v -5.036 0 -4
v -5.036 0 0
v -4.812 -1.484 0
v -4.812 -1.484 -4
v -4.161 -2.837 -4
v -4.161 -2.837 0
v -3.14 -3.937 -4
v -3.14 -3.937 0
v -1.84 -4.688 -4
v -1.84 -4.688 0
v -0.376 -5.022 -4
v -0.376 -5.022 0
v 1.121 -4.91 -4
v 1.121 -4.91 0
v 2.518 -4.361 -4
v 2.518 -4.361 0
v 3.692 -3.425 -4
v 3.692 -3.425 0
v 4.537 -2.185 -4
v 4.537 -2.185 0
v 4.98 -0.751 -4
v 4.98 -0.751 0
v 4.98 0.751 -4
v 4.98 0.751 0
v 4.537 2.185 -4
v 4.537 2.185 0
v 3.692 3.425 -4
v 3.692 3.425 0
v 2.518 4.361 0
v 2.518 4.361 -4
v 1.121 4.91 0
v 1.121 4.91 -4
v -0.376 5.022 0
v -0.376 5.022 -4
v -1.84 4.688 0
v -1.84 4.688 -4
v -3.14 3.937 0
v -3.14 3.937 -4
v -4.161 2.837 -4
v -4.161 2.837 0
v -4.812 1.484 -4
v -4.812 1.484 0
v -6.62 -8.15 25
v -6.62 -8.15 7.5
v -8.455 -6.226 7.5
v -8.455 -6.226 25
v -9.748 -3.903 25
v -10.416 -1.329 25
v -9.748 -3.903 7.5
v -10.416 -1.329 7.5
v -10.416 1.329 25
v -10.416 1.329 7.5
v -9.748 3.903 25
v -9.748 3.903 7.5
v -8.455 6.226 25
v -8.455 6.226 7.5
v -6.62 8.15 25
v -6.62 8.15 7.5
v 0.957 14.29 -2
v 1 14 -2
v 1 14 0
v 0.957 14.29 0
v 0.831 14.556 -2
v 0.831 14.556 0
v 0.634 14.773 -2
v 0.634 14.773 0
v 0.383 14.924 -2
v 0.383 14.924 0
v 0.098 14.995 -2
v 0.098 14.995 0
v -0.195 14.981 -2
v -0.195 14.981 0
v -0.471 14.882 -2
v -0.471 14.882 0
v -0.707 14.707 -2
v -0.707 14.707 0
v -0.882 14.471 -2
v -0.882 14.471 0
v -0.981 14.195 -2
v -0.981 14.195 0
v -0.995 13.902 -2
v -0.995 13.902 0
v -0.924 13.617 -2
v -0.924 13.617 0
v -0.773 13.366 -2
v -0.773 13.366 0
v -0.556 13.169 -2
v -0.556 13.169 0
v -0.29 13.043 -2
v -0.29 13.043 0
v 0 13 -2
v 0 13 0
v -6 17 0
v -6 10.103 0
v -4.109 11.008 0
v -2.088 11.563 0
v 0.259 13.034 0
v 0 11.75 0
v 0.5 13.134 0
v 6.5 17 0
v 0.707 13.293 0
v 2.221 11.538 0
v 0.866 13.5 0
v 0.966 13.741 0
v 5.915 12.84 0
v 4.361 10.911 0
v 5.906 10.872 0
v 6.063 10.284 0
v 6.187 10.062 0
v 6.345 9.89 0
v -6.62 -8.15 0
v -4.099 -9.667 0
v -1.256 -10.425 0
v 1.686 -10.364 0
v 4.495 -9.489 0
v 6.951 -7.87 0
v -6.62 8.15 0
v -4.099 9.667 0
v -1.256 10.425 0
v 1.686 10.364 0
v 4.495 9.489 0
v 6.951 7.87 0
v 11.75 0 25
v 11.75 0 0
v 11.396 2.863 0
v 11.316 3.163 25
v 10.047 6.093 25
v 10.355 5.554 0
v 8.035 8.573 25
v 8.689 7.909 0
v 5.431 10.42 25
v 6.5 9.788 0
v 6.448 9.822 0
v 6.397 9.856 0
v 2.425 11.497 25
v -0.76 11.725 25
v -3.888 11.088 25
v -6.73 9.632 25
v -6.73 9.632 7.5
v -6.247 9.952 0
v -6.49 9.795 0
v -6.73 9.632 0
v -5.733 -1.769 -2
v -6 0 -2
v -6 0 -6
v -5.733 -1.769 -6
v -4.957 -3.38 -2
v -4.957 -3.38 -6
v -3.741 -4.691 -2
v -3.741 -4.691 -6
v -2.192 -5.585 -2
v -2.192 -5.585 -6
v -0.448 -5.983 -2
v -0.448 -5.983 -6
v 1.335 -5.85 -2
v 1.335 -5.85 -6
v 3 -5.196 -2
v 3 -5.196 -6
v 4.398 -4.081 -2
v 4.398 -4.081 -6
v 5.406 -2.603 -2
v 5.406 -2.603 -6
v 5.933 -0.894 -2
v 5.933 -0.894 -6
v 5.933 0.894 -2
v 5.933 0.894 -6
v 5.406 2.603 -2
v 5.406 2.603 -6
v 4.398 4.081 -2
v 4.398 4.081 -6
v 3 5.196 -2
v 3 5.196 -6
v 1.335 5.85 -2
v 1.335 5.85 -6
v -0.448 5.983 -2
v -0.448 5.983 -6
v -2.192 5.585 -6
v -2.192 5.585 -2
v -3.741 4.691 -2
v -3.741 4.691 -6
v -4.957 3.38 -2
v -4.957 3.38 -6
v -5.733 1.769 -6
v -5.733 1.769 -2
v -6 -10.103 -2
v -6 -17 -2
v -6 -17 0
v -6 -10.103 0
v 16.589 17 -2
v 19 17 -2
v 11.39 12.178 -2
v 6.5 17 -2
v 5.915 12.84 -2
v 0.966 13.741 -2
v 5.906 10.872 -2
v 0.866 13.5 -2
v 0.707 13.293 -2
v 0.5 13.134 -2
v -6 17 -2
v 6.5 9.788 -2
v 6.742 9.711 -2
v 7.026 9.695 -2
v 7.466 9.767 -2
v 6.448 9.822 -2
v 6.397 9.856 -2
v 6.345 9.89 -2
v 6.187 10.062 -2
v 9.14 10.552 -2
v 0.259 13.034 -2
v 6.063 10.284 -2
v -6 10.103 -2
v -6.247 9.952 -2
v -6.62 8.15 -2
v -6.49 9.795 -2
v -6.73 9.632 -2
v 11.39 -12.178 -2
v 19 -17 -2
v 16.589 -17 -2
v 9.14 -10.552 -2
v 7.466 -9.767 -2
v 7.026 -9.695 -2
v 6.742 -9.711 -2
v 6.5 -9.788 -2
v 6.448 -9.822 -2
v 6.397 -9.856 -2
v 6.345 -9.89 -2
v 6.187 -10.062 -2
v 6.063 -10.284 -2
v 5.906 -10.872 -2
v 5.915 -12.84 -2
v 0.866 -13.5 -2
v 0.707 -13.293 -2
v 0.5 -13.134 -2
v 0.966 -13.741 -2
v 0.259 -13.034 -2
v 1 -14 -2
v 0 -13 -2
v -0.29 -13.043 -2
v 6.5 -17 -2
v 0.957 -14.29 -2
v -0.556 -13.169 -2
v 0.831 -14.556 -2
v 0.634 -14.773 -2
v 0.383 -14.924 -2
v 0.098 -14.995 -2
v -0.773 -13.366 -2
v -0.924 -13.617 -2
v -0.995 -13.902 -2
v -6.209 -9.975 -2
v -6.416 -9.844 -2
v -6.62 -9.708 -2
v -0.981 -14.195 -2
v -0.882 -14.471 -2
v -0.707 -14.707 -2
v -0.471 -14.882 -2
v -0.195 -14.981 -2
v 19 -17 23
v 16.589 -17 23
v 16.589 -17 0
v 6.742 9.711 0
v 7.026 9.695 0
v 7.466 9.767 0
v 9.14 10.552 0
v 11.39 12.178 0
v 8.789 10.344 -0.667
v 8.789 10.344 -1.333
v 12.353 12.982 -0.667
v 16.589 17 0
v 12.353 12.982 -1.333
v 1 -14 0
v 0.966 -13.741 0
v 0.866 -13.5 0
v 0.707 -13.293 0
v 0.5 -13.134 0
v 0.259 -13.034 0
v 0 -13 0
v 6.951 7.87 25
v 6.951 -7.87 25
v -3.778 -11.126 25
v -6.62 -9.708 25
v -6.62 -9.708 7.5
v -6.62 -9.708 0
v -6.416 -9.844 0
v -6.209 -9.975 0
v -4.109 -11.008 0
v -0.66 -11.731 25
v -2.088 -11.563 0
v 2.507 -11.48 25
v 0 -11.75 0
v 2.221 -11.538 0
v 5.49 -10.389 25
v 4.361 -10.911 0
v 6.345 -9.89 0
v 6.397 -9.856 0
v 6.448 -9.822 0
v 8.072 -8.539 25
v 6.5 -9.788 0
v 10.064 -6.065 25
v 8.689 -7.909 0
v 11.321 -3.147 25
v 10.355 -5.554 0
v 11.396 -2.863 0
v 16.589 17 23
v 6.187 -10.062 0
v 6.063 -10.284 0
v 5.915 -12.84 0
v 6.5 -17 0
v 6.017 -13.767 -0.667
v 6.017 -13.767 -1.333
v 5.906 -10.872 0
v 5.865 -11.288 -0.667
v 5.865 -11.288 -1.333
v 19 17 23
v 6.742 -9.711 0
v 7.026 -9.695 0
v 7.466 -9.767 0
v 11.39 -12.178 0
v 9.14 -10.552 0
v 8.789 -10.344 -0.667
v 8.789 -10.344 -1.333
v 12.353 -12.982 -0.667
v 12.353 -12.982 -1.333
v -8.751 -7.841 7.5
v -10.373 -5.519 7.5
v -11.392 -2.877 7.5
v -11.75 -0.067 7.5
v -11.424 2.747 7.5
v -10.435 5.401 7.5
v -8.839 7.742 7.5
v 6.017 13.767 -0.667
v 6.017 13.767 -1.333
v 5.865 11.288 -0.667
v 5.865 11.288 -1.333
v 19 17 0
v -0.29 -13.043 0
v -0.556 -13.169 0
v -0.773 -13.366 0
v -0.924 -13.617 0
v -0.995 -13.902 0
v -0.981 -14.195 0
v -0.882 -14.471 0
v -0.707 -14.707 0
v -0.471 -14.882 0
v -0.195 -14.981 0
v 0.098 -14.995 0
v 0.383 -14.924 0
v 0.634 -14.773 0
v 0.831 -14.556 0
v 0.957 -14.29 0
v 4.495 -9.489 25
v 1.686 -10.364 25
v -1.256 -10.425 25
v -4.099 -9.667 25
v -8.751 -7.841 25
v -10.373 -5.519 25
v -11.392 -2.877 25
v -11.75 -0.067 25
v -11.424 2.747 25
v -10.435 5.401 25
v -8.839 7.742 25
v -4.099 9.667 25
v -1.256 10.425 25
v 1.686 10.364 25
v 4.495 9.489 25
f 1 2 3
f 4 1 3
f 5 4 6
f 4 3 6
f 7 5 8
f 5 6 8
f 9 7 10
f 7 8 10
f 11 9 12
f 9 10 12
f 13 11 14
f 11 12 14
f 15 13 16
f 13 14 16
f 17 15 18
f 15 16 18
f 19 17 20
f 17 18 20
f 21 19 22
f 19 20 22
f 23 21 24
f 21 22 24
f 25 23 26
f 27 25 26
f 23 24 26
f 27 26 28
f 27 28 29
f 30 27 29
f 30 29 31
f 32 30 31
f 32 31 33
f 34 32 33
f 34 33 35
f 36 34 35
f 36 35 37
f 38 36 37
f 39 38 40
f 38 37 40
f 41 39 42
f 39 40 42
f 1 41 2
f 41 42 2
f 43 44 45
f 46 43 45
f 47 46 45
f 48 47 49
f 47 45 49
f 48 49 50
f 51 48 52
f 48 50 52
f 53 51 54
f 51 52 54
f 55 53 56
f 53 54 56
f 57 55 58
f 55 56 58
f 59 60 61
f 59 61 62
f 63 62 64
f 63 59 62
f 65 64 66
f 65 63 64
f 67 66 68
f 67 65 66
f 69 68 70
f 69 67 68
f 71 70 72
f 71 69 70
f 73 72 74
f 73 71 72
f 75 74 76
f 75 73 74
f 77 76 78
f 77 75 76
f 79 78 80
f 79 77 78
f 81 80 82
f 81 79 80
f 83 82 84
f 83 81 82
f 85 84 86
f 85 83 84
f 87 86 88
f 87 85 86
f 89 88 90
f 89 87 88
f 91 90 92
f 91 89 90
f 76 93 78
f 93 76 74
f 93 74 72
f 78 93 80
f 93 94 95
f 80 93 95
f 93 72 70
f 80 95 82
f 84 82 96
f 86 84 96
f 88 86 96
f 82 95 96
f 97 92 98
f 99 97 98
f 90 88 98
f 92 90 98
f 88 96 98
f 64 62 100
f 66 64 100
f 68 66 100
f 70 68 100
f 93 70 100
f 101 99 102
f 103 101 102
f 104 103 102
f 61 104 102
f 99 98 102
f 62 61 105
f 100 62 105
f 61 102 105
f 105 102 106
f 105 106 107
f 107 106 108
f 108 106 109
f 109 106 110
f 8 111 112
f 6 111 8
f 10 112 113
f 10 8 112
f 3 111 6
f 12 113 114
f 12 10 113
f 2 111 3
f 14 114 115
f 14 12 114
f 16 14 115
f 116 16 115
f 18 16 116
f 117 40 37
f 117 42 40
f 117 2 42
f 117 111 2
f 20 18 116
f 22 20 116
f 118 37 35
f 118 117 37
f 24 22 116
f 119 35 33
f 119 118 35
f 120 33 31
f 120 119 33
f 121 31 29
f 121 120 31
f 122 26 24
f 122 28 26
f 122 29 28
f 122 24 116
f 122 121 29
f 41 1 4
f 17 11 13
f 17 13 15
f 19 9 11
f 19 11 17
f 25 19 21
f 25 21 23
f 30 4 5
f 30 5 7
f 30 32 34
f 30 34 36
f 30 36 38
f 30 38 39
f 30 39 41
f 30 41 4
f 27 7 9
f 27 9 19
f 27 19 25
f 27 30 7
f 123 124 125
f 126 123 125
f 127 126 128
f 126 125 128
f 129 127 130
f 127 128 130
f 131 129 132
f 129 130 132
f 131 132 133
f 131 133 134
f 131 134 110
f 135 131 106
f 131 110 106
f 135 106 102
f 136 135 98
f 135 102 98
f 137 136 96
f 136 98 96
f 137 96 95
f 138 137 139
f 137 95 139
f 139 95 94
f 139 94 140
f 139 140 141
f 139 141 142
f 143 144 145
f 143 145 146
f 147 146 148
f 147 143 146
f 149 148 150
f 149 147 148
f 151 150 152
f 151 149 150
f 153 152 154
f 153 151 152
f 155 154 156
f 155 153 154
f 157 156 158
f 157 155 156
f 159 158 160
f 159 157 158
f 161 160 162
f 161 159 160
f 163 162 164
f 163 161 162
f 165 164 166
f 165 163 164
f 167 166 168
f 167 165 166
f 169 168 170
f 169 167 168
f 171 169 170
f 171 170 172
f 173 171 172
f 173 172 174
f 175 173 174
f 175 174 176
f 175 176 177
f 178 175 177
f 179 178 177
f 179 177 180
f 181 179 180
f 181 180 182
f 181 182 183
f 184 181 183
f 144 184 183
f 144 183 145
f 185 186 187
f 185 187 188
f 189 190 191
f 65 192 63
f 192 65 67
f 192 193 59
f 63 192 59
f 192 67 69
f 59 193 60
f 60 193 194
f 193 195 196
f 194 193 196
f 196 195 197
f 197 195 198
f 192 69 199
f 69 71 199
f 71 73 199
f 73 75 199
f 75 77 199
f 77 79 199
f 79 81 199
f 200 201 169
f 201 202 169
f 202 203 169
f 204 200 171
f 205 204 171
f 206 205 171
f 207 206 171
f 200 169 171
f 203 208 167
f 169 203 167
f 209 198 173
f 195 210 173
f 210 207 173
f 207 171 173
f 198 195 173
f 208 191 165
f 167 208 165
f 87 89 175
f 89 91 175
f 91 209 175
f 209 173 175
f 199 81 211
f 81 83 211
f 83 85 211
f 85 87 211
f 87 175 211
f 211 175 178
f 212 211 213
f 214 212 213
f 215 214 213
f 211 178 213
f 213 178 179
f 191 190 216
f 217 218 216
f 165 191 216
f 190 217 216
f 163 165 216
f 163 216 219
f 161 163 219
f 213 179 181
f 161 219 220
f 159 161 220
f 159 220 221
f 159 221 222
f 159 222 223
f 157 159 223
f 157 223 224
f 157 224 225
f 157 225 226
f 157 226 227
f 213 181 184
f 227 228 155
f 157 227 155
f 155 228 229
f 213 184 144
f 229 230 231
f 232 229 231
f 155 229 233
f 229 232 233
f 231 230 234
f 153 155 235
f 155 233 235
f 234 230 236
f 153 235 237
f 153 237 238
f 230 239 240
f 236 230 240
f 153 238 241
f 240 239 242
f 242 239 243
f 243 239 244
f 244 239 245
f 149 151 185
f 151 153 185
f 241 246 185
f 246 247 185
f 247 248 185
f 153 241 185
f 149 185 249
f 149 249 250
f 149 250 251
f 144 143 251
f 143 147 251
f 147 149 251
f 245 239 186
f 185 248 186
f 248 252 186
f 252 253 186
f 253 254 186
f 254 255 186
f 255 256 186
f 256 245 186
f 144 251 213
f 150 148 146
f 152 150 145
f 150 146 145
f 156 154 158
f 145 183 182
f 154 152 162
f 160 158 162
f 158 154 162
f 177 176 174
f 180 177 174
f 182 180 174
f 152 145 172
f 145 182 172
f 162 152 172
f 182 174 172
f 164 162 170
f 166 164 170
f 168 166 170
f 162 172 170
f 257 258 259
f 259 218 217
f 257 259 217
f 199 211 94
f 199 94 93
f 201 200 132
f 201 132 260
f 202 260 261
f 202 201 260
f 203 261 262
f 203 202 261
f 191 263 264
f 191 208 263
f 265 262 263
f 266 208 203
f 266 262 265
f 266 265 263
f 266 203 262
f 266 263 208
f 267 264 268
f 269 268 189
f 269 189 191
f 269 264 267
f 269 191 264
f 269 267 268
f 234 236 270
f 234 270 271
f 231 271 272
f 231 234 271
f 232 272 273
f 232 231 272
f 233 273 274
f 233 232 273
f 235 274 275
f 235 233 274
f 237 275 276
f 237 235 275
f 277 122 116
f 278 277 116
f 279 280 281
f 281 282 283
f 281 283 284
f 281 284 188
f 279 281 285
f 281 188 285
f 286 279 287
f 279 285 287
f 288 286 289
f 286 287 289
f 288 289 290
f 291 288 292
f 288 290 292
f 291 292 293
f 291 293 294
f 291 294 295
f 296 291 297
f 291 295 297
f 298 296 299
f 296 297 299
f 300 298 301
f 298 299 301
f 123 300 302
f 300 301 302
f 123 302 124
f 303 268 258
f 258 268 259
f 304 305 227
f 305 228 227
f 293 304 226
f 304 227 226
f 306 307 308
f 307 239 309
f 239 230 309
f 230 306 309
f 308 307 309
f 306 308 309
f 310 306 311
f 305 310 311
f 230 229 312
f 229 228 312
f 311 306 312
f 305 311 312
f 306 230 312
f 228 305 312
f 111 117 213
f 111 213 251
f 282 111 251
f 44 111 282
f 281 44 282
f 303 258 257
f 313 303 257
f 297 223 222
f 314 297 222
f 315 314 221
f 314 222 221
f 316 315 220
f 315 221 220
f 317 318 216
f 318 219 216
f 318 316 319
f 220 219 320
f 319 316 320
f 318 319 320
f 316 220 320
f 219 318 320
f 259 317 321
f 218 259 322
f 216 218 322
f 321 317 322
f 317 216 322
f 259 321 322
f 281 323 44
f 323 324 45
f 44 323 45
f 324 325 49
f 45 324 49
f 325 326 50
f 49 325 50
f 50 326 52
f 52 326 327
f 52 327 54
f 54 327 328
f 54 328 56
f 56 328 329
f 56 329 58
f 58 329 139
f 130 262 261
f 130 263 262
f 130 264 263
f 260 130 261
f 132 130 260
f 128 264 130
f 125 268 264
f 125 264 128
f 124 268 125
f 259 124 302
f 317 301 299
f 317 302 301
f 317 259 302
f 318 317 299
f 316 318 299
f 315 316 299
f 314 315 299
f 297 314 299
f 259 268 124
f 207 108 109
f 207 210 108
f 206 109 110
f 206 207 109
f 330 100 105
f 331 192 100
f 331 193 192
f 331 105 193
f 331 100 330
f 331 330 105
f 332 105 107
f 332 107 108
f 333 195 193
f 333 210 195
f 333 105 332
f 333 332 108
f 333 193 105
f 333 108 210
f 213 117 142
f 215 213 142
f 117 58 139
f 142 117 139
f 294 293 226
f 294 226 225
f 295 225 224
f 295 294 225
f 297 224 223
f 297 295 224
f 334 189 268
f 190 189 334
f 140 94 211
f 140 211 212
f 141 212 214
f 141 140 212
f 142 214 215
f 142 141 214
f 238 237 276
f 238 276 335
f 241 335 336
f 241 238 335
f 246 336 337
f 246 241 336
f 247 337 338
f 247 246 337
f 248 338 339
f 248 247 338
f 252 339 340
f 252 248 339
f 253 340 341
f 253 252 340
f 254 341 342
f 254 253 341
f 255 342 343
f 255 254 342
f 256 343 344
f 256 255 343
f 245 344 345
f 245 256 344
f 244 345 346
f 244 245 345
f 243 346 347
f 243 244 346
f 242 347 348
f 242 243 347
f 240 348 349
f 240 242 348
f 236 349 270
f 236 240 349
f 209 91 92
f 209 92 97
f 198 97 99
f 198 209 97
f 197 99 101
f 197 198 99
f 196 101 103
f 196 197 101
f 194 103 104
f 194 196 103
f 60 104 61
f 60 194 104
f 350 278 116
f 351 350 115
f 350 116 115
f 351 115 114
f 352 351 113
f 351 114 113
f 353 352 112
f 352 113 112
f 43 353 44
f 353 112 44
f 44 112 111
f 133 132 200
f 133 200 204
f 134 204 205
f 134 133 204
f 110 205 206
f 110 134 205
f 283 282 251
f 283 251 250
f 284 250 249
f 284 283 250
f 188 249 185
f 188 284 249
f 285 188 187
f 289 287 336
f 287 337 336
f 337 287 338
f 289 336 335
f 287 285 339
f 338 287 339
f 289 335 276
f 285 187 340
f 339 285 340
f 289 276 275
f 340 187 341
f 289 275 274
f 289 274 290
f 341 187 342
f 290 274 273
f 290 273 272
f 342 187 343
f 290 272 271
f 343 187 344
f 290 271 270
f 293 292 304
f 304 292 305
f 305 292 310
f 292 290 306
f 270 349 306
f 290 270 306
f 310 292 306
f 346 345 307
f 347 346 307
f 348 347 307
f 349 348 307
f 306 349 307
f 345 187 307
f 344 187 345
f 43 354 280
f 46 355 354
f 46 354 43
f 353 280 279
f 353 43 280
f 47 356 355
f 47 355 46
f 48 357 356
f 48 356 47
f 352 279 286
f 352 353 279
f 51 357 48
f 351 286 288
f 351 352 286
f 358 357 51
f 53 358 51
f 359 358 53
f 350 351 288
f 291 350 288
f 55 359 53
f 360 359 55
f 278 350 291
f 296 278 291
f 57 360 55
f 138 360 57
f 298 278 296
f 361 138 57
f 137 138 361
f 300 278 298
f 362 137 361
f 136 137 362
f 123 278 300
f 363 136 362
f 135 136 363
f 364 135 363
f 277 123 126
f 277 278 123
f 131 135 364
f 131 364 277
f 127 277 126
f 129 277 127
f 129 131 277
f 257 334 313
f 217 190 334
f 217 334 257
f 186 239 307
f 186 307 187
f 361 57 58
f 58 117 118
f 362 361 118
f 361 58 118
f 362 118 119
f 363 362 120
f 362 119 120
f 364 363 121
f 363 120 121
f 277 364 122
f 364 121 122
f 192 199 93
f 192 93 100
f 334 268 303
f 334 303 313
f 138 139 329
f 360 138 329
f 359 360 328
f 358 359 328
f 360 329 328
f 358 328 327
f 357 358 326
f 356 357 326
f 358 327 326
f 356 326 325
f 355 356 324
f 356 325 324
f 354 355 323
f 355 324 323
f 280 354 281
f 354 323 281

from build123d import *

# Parameters (mm, degrees)
F1_DEPTH = 2
F2_DEPTH = 25
F3_DEPTH = 6
F4_DEPTH = 4
F5_DEPTH = 7.5
F6_W     = 2.410814777
F6_H     = 34
F7_DEPTH = 2
F8_DEPTH = 25


with BuildPart() as f1:
    # F0 (on Top) → F1 (new body)
    with BuildSketch(Plane.XY):
        with BuildLine():
            Line((-6.7297284225, 9.6318874245), (-6.62, 8.1501901818))
            ThreePointArc((-6.62, 8.1501901818), (0.2169015369, 10.4977594621), (6.951, 7.8697902767))
            ThreePointArc((6.951, 7.8697902767), (10.5, 0), (6.951, -7.8697902767))
            ThreePointArc((6.951, -7.8697902767), (0.2169015369, -10.4977594621), (-6.62, -8.1501901818))
            Line((-6.62, -8.1501901818), (-6.62, -9.7076310189))
            ThreePointArc((-6.62, -9.7076310189), (5.4898770478, -10.3886356178), (11.75, 0))
            ThreePointArc((11.75, 0), (5.4308466667, 10.4196163309), (-6.7297284225, 9.6318874245))
        make_face()
        with BuildLine():
            ThreePointArc((-6.62, -8.1501901818), (-10.5, 0), (-6.62, 8.1501901818))
            Line((-6.62, 8.1501901818), (-6.7297284225, 9.6318874245))
            ThreePointArc((-6.7297284225, 9.6318874245), (-11.749810877, -0.0666659936), (-6.62, -9.7076310189))
            Line((-6.62, -9.7076310189), (-6.62, -8.1501901818))
        make_face()
        with BuildLine():
            Line((-6.62, 8.1501901818), (-6.62, 0))
            Line((-6.62, 0), (-6.62, -8.1501901818))
            ThreePointArc((-6.62, -8.1501901818), (0.2169015369, -10.4977594621), (6.951, -7.8697902767))
            Line((6.951, -7.8697902767), (6.951, 7.8697902767))
            ThreePointArc((6.951, 7.8697902767), (0.2169015369, 10.4977594621), (-6.62, 8.1501901818))
        make_face()
        with BuildLine():
            ThreePointArc((6, 0), (0, -6), (-6, 0))
            ThreePointArc((-6, 0), (0, 6), (6, 0))
        make_face(mode=Mode.SUBTRACT)
        with BuildLine():
            ThreePointArc((6, 0), (0, 6), (-6, 0))
            ThreePointArc((-6, 0), (0, -6), (6, 0))
        make_face()
        with BuildLine():
            ThreePointArc((5.0361404657, 0), (0, -5.0361404657), (-5.0361404657, 0))
            ThreePointArc((-5.0361404657, 0), (0, 5.0361404657), (5.0361404657, 0))
        make_face(mode=Mode.SUBTRACT)
        with BuildLine():
            ThreePointArc((5.0361404657, 0), (0, 5.0361404657), (-5.0361404657, 0))
            ThreePointArc((-5.0361404657, 0), (0, -5.0361404657), (5.0361404657, 0))
        make_face()
        with BuildLine():
            ThreePointArc((6.951, -7.8697902767), (10.5, 0), (6.951, 7.8697902767))
            Line((6.951, 7.8697902767), (6.951, -7.8697902767))
        make_face()
    extrude(amount=-F1_DEPTH)

    # F0 (on Top) → F2 (join)
    with BuildSketch(Plane.XY):
        with BuildLine():
            Line((-6.7297284225, 9.6318874245), (-6.62, 8.1501901818))
            ThreePointArc((-6.62, 8.1501901818), (0.2169015369, 10.4977594621), (6.951, 7.8697902767))
            ThreePointArc((6.951, 7.8697902767), (10.5, 0), (6.951, -7.8697902767))
            ThreePointArc((6.951, -7.8697902767), (0.2169015369, -10.4977594621), (-6.62, -8.1501901818))
            Line((-6.62, -8.1501901818), (-6.62, -9.7076310189))
            ThreePointArc((-6.62, -9.7076310189), (5.4898770478, -10.3886356178), (11.75, 0))
            ThreePointArc((11.75, 0), (5.4308466667, 10.4196163309), (-6.7297284225, 9.6318874245))
        make_face()
        with BuildLine():
            ThreePointArc((-6.62, -8.1501901818), (-10.5, 0), (-6.62, 8.1501901818))
            Line((-6.62, 8.1501901818), (-6.7297284225, 9.6318874245))
            ThreePointArc((-6.7297284225, 9.6318874245), (-11.749810877, -0.0666659936), (-6.62, -9.7076310189))
            Line((-6.62, -9.7076310189), (-6.62, -8.1501901818))
        make_face()
        with BuildLine():
            ThreePointArc((6.951, -7.8697902767), (10.5, 0), (6.951, 7.8697902767))
            Line((6.951, 7.8697902767), (6.951, -7.8697902767))
        make_face()
    extrude(amount=F2_DEPTH)

    # F0 (on Top) → F3 (join)
    with BuildSketch(Plane.XY):
        with BuildLine():
            ThreePointArc((6, 0), (0, 6), (-6, 0))
            ThreePointArc((-6, 0), (0, -6), (6, 0))
        make_face()
        with BuildLine():
            ThreePointArc((5.0361404657, 0), (0, -5.0361404657), (-5.0361404657, 0))
            ThreePointArc((-5.0361404657, 0), (0, 5.0361404657), (5.0361404657, 0))
        make_face(mode=Mode.SUBTRACT)
        with BuildLine():
            ThreePointArc((5.0361404657, 0), (0, 5.0361404657), (-5.0361404657, 0))
            ThreePointArc((-5.0361404657, 0), (0, -5.0361404657), (5.0361404657, 0))
        make_face()
    extrude(amount=-F3_DEPTH)

    # F0 (on Top) → F4 (cut)
    with BuildSketch(Plane.XY):
        with BuildLine():
            ThreePointArc((5.0361404657, 0), (0, 5.0361404657), (-5.0361404657, 0))
            ThreePointArc((-5.0361404657, 0), (0, -5.0361404657), (5.0361404657, 0))
        make_face()
    extrude(amount=-F4_DEPTH, mode=Mode.SUBTRACT)

    # F0 (on Top) → F5 (cut, symmetric)
    with BuildSketch(Plane.XY):
        with BuildLine():
            ThreePointArc((-6.62, -8.1501901818), (-10.5, 0), (-6.62, 8.1501901818))
            Line((-6.62, 8.1501901818), (-6.7297284225, 9.6318874245))
            ThreePointArc((-6.7297284225, 9.6318874245), (-11.749810877, -0.0666659936), (-6.62, -9.7076310189))
            Line((-6.62, -9.7076310189), (-6.62, -8.1501901818))
        make_face()
    extrude(amount=F5_DEPTH, both=True, mode=Mode.SUBTRACT)

    # F6 (on face) → F7 (join)
    with BuildSketch(Plane(origin=(0, 0, -2), x_dir=(1, 0, 0), z_dir=(0, 0, -1))):
        with BuildLine():
            add(Edge.make_bspline(
                [(6.5, 9.7883859752), (7.9509627356, 9.0697935318), (12.2177111532, 12.5251344048), (16.589185223, 17)],
                knots=[0.4326455833, 0.4326455833, 0.4326455833, 0.4326455833, 1, 1, 1, 1], degree=3))
            ThreePointArc((6.5, 9.7883859752), (11.75, 0), (6.5, -9.7883859752))
            add(Edge.make_bspline(
                [(6.5, -9.7883859752), (7.9509627356, -9.0697935318), (12.2177111532, -12.5251344048), (16.589185223, -17)],
                knots=[0.4326455833, 0.4326455833, 0.4326455833, 0.4326455833, 1, 1, 1, 1], degree=3))
            Line((16.589185223, -17), (16.589185223, 17))
        make_face()
        with BuildLine():
            ThreePointArc((6.3446577013, -9.8897835494), (3.3058692726, -11.2753593447), (0, -11.75))
            ThreePointArc((0, -11.75), (-3.1110260013, -11.3306671127), (-6, -10.1025986756))
            Line((-6, -10.1025986756), (-6, -17))
            Line((-6, -17), (6.5, -17))
            add(Edge.make_bspline(
                [(6.5, -17), (5.9535607354, -13.4978269056), (5.4472970387, -10.6387474187), (6.3446577013, -9.8897835494)],
                knots=[0, 0, 0, 0, 0.4107914195, 0.4107914195, 0.4107914195, 0.4107914195], degree=3))
        make_face()
        with BuildLine():
            ThreePointArc((1, -14), (-0.7071067812, -14.7071067812), (0, -13))
            ThreePointArc((0, -13), (0.7071067812, -13.2928932188), (1, -14))
        make_face(mode=Mode.SUBTRACT)
        with BuildLine():
            ThreePointArc((-6, 10.1025986756), (-3.1110260013, 11.3306671127), (0, 11.75))
            ThreePointArc((0, 11.75), (3.3058692726, 11.2753593447), (6.3446577013, 9.8897835494))
            add(Edge.make_bspline(
                [(6.5, 17), (5.9535607354, 13.4978269056), (5.4472970387, 10.6387474187), (6.3446577013, 9.8897835494)],
                knots=[0, 0, 0, 0, 0.4107914195, 0.4107914195, 0.4107914195, 0.4107914195], degree=3))
            Line((6.5, 17), (-6, 17))
            Line((-6, 17), (-6, 10.1025986756))
        make_face()
        with BuildLine():
            ThreePointArc((1, 14), (0.7071067812, 13.2928932188), (0, 13))
            ThreePointArc((0, 13), (-0.7071067812, 14.7071067812), (1, 14))
        make_face(mode=Mode.SUBTRACT)
        with Locations((17.7945926115, 0)):
            Rectangle(F6_W, F6_H)
    extrude(amount=-F7_DEPTH)

    # F6 (on face) → F8 (join)
    with BuildSketch(Plane(origin=(0, 0, -2), x_dir=(1, 0, 0), z_dir=(0, 0, -1))):
        with Locations((17.7945926115, 0)):
            Rectangle(F6_W, F6_H)
    extrude(amount=-F8_DEPTH)


solid = f1.part
